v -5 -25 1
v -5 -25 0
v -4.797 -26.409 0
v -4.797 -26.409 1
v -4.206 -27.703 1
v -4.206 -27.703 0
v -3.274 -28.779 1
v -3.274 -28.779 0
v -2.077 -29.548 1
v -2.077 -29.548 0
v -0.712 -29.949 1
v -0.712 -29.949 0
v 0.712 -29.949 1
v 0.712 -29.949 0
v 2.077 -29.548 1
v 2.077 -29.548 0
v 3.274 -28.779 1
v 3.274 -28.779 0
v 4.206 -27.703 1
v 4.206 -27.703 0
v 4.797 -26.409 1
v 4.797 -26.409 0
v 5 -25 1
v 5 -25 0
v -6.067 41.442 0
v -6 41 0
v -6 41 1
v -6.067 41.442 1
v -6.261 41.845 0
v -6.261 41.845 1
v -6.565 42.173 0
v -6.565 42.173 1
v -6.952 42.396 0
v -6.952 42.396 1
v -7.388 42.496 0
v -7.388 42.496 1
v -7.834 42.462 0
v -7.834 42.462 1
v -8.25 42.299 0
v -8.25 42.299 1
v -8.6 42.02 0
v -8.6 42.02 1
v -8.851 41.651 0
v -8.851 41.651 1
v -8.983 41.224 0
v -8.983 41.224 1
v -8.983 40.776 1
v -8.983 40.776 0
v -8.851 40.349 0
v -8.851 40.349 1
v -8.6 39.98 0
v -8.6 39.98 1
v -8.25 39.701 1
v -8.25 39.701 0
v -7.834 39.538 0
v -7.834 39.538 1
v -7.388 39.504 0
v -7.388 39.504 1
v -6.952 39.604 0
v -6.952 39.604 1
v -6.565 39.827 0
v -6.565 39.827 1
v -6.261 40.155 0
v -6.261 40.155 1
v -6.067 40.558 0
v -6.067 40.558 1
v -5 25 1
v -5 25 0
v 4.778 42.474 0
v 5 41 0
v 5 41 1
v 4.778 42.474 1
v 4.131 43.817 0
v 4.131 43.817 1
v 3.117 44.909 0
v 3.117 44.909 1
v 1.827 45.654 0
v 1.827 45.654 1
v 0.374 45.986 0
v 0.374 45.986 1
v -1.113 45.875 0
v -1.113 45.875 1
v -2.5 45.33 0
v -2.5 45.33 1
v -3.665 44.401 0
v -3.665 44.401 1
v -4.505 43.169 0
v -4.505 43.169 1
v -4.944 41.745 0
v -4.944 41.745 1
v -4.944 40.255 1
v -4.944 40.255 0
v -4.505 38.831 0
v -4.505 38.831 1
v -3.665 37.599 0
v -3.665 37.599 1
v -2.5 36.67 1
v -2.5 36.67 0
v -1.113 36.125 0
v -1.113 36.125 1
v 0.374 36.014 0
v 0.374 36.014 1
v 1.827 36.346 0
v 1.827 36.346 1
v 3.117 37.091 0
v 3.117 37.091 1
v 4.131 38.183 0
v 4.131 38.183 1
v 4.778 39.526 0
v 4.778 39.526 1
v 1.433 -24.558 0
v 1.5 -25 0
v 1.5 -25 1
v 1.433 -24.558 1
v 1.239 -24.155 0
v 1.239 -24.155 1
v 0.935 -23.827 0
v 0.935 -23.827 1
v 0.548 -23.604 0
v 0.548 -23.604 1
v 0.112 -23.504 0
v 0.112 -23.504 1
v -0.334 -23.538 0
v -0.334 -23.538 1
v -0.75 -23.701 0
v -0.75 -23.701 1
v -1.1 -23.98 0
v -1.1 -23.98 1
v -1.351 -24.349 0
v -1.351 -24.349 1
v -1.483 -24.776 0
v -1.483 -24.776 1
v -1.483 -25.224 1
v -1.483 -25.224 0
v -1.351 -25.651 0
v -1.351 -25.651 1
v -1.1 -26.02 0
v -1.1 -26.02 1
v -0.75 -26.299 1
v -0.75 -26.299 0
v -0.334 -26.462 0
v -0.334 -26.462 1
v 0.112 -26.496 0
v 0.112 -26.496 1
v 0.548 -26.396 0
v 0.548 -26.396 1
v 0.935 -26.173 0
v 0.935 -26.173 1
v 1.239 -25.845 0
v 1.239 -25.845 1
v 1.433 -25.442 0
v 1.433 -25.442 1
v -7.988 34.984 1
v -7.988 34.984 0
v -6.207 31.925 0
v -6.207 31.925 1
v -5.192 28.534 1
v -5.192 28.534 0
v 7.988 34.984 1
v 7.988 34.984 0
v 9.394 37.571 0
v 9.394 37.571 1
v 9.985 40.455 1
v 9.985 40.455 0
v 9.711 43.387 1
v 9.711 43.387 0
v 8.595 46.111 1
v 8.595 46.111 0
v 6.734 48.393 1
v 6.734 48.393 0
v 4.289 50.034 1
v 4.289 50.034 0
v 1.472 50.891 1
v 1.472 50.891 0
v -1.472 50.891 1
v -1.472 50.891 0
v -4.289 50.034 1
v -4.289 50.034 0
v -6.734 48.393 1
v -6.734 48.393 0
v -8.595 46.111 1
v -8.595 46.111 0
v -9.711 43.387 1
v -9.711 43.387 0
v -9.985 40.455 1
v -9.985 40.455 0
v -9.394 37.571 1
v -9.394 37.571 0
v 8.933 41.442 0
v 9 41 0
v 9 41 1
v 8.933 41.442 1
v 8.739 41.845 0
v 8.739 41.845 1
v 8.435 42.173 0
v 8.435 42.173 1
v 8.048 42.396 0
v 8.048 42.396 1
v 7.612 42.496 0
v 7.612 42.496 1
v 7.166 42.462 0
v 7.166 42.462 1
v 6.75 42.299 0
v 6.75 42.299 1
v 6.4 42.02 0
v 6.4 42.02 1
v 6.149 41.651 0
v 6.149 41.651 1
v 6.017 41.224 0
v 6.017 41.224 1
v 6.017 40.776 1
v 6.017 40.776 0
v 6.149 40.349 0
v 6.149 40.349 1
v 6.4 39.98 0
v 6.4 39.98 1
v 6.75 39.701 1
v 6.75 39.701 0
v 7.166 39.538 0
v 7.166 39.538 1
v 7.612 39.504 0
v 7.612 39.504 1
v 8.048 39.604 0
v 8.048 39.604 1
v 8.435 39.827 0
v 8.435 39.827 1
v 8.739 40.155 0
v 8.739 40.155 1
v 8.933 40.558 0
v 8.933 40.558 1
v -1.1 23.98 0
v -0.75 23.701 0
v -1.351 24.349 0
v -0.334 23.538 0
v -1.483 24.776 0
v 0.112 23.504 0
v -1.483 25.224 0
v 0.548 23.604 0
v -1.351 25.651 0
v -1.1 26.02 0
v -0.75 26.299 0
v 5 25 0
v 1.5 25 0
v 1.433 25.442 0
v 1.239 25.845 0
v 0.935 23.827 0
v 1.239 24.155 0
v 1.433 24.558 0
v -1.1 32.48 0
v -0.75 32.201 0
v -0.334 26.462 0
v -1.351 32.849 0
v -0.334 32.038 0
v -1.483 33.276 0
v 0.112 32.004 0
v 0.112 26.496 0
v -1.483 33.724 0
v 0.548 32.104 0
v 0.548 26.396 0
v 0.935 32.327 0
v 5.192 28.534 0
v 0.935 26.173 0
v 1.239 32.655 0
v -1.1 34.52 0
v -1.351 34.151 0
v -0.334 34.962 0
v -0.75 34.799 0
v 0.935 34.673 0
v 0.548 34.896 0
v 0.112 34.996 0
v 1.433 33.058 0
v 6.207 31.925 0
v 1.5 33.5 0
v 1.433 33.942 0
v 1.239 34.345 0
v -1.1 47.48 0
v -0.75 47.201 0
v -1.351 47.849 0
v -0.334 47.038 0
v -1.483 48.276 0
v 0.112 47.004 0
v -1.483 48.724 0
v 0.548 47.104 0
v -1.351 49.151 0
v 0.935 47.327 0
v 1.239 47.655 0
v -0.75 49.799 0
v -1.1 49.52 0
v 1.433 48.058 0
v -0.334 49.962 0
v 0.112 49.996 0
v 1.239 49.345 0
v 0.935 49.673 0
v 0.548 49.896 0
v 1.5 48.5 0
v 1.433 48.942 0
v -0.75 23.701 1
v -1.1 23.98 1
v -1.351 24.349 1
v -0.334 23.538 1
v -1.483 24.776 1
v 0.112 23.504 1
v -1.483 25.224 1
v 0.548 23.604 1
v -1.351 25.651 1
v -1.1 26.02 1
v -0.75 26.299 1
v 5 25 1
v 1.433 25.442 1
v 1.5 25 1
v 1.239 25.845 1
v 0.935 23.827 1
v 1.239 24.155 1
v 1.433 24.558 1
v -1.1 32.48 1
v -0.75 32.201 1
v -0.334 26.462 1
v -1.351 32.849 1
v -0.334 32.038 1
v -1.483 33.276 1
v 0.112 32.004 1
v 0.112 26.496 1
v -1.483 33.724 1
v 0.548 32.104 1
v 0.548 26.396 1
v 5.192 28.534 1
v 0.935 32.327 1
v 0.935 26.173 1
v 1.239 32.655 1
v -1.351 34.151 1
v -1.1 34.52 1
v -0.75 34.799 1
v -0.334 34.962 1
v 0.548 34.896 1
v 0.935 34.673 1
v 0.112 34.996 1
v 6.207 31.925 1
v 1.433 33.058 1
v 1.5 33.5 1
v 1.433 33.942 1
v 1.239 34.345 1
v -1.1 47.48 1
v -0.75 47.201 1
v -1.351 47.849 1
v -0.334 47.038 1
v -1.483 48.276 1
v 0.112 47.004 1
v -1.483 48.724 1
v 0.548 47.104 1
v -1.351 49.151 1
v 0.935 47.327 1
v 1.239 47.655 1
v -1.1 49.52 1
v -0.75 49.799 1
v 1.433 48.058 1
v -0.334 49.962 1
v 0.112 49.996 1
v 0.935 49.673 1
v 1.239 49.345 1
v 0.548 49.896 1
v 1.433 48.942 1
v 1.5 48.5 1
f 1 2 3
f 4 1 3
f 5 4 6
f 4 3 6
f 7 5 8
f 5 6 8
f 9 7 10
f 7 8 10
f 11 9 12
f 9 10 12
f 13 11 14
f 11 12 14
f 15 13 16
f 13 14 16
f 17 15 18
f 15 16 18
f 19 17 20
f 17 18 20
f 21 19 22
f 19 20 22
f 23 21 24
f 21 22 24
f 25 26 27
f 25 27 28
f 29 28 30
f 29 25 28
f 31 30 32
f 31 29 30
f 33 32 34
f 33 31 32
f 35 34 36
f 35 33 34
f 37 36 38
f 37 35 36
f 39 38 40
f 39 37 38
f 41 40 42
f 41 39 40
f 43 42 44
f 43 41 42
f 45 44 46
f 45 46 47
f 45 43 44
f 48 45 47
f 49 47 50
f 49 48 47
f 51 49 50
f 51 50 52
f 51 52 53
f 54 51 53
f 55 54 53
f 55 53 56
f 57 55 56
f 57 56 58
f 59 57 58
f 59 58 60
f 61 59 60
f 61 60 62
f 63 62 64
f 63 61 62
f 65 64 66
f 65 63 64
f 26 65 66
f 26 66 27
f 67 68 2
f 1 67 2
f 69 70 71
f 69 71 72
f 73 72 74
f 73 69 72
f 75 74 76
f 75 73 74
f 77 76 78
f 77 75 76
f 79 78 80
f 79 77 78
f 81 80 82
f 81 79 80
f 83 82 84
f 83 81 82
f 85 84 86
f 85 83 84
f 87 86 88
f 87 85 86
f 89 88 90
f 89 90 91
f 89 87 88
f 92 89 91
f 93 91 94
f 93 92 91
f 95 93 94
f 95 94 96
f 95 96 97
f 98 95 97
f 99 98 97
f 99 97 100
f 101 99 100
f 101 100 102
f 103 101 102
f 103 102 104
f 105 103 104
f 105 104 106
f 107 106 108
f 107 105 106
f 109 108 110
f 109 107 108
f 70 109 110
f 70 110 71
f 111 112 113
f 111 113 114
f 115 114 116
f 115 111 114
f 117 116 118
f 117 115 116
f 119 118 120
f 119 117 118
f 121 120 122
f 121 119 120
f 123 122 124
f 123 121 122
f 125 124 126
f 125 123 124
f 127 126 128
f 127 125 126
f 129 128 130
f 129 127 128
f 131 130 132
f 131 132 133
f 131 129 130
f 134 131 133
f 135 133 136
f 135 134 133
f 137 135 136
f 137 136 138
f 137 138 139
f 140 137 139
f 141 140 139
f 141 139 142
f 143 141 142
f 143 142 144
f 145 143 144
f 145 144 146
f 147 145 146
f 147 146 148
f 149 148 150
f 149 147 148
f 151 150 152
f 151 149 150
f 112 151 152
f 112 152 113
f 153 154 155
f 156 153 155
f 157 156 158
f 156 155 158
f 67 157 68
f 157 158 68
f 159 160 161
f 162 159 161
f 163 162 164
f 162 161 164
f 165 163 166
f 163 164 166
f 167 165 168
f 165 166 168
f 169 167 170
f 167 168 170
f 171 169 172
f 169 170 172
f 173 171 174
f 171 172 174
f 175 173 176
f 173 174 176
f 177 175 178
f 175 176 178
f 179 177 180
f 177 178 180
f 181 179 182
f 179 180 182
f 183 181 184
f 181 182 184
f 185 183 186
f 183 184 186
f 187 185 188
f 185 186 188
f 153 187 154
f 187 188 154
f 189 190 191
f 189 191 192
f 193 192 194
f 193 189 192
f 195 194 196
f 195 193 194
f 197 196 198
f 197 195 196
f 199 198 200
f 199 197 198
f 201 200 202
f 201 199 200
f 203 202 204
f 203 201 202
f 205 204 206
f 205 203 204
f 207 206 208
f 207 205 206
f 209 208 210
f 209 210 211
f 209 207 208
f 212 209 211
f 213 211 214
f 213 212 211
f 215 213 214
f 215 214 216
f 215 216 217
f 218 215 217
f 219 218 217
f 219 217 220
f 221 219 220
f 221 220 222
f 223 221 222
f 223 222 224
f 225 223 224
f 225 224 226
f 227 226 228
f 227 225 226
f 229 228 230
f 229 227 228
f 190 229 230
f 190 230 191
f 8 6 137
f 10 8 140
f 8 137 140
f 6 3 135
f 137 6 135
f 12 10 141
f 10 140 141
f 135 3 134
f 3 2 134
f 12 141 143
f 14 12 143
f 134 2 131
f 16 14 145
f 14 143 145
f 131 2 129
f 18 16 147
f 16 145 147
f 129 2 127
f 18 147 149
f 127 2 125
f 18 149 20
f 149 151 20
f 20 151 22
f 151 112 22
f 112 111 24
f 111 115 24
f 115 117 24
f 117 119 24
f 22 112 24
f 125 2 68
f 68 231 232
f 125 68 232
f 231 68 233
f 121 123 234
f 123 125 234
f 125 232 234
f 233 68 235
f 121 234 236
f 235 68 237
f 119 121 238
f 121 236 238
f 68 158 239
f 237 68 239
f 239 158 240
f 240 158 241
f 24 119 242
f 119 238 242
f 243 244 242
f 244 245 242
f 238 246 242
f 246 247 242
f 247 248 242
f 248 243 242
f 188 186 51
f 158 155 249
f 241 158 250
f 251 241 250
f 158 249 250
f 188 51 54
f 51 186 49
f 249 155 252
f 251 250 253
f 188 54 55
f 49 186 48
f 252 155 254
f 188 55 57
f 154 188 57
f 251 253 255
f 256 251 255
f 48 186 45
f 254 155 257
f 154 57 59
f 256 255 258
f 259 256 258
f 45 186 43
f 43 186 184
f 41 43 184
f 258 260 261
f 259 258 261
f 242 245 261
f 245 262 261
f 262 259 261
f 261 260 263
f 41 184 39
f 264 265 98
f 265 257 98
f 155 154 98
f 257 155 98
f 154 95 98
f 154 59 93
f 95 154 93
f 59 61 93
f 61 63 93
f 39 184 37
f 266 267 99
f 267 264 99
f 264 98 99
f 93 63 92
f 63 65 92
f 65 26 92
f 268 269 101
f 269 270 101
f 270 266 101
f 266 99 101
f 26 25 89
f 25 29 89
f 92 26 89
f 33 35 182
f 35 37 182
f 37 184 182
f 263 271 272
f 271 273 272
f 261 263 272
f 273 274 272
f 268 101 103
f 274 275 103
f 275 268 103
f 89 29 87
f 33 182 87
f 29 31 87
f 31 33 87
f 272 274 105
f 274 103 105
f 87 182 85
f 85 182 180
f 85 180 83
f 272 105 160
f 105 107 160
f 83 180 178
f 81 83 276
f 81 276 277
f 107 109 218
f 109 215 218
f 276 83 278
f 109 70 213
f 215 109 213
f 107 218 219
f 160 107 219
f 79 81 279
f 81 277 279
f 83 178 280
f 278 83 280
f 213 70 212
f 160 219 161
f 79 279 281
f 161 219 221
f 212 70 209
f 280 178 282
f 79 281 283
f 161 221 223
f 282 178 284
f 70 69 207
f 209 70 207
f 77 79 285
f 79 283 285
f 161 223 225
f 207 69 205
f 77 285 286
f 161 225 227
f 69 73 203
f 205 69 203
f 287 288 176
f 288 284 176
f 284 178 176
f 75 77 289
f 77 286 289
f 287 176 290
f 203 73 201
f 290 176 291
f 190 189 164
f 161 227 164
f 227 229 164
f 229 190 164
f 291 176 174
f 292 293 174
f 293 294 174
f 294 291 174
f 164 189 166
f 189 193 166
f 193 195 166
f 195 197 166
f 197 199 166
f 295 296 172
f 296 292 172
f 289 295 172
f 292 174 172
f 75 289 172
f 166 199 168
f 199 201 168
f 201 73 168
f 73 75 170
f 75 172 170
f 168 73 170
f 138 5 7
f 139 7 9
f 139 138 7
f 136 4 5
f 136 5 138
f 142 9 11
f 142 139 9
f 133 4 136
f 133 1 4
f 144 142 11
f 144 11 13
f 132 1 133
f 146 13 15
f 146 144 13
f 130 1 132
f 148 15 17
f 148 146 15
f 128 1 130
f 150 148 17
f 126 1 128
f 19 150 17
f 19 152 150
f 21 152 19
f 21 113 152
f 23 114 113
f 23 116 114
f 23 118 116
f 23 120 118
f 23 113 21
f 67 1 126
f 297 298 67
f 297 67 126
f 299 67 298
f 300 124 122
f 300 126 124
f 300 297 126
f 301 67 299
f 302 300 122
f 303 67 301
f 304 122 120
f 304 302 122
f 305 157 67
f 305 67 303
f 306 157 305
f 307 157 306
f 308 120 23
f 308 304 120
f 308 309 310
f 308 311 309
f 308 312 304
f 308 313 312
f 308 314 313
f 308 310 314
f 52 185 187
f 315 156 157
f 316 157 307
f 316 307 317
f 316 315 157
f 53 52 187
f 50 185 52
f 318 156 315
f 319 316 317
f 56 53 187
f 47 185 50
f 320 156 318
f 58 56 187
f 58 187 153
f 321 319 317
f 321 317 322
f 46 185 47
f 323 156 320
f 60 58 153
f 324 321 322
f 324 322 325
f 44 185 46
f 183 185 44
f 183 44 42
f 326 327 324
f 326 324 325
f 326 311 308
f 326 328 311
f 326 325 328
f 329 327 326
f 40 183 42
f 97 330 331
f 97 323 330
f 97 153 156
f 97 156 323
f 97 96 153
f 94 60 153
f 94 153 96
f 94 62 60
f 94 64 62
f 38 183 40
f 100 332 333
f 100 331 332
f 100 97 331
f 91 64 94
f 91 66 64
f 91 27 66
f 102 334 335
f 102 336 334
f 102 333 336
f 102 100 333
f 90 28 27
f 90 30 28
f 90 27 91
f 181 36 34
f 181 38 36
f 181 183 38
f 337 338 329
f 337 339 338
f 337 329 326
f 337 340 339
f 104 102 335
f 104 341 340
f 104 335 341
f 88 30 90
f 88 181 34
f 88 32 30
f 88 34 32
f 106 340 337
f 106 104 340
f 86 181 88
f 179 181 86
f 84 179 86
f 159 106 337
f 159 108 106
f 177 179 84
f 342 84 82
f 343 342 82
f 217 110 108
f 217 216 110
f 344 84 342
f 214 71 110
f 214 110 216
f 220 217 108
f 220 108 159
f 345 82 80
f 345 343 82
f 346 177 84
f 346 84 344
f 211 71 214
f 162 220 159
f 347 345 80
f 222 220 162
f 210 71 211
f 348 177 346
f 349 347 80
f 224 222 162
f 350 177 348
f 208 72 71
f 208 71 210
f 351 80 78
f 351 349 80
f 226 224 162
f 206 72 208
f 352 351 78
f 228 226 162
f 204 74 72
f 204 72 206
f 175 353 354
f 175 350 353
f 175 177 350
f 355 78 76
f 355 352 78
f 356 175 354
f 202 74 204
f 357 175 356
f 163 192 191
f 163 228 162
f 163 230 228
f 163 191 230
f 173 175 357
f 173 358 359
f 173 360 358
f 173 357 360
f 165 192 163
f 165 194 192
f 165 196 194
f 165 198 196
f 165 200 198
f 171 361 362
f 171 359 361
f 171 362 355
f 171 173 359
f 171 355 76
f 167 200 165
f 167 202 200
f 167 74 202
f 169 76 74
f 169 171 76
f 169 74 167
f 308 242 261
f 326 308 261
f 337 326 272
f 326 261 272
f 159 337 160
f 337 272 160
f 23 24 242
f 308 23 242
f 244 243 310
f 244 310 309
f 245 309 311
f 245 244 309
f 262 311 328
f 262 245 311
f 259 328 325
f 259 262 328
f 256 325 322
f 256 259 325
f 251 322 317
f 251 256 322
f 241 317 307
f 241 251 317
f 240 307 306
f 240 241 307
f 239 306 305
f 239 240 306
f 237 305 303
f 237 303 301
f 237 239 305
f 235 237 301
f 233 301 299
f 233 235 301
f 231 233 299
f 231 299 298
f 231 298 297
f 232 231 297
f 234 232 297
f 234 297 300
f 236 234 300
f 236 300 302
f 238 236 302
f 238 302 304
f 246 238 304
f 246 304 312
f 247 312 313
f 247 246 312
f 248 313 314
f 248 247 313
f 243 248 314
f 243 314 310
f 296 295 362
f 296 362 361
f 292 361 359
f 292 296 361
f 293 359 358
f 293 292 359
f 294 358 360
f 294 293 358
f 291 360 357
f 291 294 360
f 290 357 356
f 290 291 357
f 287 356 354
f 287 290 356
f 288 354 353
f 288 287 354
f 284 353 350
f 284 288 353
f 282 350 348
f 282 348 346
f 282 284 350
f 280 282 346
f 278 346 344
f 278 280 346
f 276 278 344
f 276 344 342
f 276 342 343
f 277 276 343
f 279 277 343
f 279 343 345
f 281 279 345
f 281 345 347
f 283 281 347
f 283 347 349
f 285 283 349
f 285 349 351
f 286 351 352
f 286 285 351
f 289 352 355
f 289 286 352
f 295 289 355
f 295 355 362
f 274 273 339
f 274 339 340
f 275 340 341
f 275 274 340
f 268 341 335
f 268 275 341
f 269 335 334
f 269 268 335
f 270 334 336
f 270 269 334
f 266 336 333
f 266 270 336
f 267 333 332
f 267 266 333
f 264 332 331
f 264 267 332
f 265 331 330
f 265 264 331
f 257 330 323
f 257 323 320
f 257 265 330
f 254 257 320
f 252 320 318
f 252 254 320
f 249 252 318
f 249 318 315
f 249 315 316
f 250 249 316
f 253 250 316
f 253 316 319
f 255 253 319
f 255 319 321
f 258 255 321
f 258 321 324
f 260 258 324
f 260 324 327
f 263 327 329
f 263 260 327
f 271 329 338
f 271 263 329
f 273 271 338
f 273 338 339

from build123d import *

# Parameters (mm, degrees)
SKETCH_1_R      = 1.5
SKETCH_1_R_2    = 5
EXTRUDE_1_DEPTH = 1


with BuildPart() as part:
    # 草图1 → 凸台-拉伸1 (new body)
    with BuildSketch(Plane.XY):
        with BuildLine():
            Line((-5, 25), (-5, -25))
            ThreePointArc((-5, -25), (0, -30), (5, -25))
            Line((5, -25), (5, 25))
            ThreePointArc((5, 25), (5.598988732, 30.259631636), (7.987721006, 34.983662814))
            ThreePointArc((7.987721006, 34.983662814), (0, 51), (-7.987721006, 34.983662814))
            ThreePointArc((-7.987721006, 34.983662814), (-5.598988732, 30.259631636), (-5, 25))
        make_face()
        with Locations((0, -25)):
            Circle(SKETCH_1_R, mode=Mode.SUBTRACT)
        with Locations((0, 25)):
            Circle(SKETCH_1_R, mode=Mode.SUBTRACT)
        with Locations((7.5, 41)):
            Circle(SKETCH_1_R, mode=Mode.SUBTRACT)
        with Locations((-7.5, 41)):
            Circle(SKETCH_1_R, mode=Mode.SUBTRACT)
        with Locations((0, 33.5)):
            Circle(SKETCH_1_R, mode=Mode.SUBTRACT)
        with Locations((0, 41)):
            Circle(SKETCH_1_R_2, mode=Mode.SUBTRACT)
        with Locations((0, 48.5)):
            Circle(SKETCH_1_R, mode=Mode.SUBTRACT)
    extrude(amount=EXTRUDE_1_DEPTH)


solid = part.part
